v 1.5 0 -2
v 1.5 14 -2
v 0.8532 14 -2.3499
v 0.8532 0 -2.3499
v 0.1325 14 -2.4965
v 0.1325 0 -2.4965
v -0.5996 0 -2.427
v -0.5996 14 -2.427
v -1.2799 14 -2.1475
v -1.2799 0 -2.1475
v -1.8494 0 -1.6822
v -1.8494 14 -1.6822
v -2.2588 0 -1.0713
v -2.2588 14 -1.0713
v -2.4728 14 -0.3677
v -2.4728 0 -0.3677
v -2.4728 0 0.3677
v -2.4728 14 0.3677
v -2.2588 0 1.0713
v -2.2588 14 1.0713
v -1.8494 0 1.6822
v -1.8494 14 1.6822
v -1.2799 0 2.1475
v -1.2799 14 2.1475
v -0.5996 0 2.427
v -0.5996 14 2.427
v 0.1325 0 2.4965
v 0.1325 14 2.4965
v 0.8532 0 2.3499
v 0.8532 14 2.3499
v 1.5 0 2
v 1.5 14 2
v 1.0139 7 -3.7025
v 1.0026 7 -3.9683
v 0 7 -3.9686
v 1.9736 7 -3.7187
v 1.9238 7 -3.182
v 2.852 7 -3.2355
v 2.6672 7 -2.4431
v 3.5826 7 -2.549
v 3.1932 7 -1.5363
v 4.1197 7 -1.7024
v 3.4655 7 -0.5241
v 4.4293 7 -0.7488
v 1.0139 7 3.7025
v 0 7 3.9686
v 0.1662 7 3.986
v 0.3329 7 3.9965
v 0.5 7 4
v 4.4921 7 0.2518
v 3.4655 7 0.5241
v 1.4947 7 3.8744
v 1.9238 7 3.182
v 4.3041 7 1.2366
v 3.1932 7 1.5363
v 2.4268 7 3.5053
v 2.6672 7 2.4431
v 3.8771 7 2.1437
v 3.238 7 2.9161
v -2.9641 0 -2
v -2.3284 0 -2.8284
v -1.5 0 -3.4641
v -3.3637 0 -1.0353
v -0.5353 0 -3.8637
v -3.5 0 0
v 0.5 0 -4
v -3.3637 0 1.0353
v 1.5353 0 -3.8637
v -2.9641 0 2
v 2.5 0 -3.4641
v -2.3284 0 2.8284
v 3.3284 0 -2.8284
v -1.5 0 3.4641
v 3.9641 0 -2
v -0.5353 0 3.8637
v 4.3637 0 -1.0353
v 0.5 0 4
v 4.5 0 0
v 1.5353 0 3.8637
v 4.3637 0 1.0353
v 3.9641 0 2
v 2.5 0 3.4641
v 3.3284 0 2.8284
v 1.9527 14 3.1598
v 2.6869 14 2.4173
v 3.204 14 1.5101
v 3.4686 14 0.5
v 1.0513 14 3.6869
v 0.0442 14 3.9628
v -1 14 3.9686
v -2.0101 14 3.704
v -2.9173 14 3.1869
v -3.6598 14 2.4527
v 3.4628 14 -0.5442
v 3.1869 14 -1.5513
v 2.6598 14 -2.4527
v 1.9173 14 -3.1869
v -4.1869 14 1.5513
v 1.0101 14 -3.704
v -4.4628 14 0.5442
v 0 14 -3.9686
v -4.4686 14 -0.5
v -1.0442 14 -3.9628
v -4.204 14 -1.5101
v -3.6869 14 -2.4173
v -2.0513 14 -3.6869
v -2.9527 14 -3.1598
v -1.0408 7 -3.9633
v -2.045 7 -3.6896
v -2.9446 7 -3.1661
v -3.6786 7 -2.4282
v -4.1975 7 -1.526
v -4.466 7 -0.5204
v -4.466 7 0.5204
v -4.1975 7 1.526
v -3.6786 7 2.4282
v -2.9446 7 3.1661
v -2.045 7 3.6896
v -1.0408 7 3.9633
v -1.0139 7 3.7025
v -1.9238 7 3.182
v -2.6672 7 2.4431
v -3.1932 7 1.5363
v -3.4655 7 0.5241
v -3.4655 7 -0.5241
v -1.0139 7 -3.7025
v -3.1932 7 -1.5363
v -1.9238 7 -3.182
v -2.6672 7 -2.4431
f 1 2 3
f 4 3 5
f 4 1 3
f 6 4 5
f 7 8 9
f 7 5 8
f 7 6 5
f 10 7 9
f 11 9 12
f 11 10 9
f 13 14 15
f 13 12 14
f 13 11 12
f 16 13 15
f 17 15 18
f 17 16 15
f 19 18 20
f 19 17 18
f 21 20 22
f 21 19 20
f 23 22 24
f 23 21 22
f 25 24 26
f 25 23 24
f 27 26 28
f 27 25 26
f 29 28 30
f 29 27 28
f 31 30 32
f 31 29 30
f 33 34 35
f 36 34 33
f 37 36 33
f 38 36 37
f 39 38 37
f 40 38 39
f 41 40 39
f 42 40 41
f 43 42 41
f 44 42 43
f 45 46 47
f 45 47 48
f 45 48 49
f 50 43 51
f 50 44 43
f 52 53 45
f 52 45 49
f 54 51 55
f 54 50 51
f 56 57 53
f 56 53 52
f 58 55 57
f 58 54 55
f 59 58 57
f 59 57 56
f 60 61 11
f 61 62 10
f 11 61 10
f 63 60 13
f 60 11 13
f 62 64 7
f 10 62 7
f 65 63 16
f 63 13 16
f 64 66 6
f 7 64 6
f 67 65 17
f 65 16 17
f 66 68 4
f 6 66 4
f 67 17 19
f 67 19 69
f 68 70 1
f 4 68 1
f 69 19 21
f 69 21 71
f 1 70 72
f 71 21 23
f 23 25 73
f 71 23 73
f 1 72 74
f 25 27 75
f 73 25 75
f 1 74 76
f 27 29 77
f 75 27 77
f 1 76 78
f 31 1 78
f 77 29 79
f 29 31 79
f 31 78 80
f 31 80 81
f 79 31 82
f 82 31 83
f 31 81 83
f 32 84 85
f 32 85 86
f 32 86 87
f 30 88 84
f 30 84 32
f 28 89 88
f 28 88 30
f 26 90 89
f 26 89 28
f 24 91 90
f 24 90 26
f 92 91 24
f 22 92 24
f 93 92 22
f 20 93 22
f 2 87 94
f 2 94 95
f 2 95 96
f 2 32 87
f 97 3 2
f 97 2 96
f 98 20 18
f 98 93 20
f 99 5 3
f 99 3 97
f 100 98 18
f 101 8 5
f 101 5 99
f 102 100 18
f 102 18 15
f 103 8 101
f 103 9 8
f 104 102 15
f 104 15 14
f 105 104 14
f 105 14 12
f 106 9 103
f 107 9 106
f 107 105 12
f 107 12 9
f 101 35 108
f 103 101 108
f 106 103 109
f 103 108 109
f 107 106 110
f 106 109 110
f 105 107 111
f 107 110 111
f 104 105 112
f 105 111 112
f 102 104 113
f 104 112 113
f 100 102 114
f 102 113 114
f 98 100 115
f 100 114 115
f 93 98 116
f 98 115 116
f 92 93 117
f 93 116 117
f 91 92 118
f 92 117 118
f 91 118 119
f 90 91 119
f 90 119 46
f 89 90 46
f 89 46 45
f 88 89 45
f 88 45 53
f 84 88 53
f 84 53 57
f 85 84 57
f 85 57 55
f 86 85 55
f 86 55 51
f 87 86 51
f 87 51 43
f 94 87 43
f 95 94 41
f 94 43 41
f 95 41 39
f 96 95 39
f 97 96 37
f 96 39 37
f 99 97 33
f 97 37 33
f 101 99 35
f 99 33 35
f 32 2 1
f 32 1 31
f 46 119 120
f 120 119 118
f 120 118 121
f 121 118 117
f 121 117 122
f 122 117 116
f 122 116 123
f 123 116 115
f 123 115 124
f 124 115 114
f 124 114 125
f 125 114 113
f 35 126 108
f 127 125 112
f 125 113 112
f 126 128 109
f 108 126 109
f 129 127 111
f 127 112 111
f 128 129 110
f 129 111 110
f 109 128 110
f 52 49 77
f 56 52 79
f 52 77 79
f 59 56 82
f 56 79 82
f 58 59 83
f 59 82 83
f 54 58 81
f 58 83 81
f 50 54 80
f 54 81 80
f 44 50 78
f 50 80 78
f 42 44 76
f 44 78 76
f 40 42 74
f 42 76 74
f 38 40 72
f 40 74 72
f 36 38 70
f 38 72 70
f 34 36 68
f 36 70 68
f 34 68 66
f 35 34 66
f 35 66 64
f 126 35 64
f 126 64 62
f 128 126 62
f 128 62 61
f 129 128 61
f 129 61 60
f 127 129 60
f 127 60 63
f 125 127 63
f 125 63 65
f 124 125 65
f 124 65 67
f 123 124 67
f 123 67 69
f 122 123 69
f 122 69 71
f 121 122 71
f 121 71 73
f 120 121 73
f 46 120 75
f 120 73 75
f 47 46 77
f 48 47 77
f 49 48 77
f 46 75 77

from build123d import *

# Parameters (mm, degrees)
SKETCH1_R           = 4
SKETCH1_R_2         = 2.5
BOSS_EXTRUDE1_DEPTH = 7
SKETCH2_R           = 4
SKETCH2_R_2         = 2.5
BOSS_EXTRUDE2_DEPTH = 7
BOSS_EXTRUDE3_DEPTH = 14


with BuildPart() as part:
    # Sketch1 → Boss-Extrude1 (new body)
    with BuildSketch(Plane(origin=(0, 0, 0), x_dir=(1, 0, 0), z_dir=(0, 1, 0))):
        with Locations(Location((0.5, 0, 0), (0, 0, 270))):
            Circle(SKETCH1_R)
        with Locations(Location((0, 0, 0), (0, 0, 270))):
            Circle(SKETCH1_R_2, mode=Mode.SUBTRACT)
    extrude(amount=BOSS_EXTRUDE1_DEPTH)

    # Sketch2 → Boss-Extrude2 (add)
    with BuildSketch(Plane(origin=(0, 7, 0), x_dir=(1, 0, 0), z_dir=(0, 1, 0))):
        with Locations(Location((-0.5, 0, 0), (0, 0, 82.819244219))):
            Circle(SKETCH2_R)
        with Locations(Location((0, 0, 0), (0, 0, 270))):
            Circle(SKETCH2_R_2, mode=Mode.SUBTRACT)
    extrude(amount=BOSS_EXTRUDE2_DEPTH)

    # Sketch3 → Boss-Extrude3 (add, through all)
    with BuildSketch(Plane(origin=(0, 14, 0), x_dir=(1, 0, 0), z_dir=(0, 1, 0))):
        with BuildLine():
            Line((1.5, 2), (1.5, -2))
            ThreePointArc((1.5, -2), (2.5, 0), (1.5, 2))
        make_face()
    extrude(amount=-BOSS_EXTRUDE3_DEPTH)


solid = part.part
